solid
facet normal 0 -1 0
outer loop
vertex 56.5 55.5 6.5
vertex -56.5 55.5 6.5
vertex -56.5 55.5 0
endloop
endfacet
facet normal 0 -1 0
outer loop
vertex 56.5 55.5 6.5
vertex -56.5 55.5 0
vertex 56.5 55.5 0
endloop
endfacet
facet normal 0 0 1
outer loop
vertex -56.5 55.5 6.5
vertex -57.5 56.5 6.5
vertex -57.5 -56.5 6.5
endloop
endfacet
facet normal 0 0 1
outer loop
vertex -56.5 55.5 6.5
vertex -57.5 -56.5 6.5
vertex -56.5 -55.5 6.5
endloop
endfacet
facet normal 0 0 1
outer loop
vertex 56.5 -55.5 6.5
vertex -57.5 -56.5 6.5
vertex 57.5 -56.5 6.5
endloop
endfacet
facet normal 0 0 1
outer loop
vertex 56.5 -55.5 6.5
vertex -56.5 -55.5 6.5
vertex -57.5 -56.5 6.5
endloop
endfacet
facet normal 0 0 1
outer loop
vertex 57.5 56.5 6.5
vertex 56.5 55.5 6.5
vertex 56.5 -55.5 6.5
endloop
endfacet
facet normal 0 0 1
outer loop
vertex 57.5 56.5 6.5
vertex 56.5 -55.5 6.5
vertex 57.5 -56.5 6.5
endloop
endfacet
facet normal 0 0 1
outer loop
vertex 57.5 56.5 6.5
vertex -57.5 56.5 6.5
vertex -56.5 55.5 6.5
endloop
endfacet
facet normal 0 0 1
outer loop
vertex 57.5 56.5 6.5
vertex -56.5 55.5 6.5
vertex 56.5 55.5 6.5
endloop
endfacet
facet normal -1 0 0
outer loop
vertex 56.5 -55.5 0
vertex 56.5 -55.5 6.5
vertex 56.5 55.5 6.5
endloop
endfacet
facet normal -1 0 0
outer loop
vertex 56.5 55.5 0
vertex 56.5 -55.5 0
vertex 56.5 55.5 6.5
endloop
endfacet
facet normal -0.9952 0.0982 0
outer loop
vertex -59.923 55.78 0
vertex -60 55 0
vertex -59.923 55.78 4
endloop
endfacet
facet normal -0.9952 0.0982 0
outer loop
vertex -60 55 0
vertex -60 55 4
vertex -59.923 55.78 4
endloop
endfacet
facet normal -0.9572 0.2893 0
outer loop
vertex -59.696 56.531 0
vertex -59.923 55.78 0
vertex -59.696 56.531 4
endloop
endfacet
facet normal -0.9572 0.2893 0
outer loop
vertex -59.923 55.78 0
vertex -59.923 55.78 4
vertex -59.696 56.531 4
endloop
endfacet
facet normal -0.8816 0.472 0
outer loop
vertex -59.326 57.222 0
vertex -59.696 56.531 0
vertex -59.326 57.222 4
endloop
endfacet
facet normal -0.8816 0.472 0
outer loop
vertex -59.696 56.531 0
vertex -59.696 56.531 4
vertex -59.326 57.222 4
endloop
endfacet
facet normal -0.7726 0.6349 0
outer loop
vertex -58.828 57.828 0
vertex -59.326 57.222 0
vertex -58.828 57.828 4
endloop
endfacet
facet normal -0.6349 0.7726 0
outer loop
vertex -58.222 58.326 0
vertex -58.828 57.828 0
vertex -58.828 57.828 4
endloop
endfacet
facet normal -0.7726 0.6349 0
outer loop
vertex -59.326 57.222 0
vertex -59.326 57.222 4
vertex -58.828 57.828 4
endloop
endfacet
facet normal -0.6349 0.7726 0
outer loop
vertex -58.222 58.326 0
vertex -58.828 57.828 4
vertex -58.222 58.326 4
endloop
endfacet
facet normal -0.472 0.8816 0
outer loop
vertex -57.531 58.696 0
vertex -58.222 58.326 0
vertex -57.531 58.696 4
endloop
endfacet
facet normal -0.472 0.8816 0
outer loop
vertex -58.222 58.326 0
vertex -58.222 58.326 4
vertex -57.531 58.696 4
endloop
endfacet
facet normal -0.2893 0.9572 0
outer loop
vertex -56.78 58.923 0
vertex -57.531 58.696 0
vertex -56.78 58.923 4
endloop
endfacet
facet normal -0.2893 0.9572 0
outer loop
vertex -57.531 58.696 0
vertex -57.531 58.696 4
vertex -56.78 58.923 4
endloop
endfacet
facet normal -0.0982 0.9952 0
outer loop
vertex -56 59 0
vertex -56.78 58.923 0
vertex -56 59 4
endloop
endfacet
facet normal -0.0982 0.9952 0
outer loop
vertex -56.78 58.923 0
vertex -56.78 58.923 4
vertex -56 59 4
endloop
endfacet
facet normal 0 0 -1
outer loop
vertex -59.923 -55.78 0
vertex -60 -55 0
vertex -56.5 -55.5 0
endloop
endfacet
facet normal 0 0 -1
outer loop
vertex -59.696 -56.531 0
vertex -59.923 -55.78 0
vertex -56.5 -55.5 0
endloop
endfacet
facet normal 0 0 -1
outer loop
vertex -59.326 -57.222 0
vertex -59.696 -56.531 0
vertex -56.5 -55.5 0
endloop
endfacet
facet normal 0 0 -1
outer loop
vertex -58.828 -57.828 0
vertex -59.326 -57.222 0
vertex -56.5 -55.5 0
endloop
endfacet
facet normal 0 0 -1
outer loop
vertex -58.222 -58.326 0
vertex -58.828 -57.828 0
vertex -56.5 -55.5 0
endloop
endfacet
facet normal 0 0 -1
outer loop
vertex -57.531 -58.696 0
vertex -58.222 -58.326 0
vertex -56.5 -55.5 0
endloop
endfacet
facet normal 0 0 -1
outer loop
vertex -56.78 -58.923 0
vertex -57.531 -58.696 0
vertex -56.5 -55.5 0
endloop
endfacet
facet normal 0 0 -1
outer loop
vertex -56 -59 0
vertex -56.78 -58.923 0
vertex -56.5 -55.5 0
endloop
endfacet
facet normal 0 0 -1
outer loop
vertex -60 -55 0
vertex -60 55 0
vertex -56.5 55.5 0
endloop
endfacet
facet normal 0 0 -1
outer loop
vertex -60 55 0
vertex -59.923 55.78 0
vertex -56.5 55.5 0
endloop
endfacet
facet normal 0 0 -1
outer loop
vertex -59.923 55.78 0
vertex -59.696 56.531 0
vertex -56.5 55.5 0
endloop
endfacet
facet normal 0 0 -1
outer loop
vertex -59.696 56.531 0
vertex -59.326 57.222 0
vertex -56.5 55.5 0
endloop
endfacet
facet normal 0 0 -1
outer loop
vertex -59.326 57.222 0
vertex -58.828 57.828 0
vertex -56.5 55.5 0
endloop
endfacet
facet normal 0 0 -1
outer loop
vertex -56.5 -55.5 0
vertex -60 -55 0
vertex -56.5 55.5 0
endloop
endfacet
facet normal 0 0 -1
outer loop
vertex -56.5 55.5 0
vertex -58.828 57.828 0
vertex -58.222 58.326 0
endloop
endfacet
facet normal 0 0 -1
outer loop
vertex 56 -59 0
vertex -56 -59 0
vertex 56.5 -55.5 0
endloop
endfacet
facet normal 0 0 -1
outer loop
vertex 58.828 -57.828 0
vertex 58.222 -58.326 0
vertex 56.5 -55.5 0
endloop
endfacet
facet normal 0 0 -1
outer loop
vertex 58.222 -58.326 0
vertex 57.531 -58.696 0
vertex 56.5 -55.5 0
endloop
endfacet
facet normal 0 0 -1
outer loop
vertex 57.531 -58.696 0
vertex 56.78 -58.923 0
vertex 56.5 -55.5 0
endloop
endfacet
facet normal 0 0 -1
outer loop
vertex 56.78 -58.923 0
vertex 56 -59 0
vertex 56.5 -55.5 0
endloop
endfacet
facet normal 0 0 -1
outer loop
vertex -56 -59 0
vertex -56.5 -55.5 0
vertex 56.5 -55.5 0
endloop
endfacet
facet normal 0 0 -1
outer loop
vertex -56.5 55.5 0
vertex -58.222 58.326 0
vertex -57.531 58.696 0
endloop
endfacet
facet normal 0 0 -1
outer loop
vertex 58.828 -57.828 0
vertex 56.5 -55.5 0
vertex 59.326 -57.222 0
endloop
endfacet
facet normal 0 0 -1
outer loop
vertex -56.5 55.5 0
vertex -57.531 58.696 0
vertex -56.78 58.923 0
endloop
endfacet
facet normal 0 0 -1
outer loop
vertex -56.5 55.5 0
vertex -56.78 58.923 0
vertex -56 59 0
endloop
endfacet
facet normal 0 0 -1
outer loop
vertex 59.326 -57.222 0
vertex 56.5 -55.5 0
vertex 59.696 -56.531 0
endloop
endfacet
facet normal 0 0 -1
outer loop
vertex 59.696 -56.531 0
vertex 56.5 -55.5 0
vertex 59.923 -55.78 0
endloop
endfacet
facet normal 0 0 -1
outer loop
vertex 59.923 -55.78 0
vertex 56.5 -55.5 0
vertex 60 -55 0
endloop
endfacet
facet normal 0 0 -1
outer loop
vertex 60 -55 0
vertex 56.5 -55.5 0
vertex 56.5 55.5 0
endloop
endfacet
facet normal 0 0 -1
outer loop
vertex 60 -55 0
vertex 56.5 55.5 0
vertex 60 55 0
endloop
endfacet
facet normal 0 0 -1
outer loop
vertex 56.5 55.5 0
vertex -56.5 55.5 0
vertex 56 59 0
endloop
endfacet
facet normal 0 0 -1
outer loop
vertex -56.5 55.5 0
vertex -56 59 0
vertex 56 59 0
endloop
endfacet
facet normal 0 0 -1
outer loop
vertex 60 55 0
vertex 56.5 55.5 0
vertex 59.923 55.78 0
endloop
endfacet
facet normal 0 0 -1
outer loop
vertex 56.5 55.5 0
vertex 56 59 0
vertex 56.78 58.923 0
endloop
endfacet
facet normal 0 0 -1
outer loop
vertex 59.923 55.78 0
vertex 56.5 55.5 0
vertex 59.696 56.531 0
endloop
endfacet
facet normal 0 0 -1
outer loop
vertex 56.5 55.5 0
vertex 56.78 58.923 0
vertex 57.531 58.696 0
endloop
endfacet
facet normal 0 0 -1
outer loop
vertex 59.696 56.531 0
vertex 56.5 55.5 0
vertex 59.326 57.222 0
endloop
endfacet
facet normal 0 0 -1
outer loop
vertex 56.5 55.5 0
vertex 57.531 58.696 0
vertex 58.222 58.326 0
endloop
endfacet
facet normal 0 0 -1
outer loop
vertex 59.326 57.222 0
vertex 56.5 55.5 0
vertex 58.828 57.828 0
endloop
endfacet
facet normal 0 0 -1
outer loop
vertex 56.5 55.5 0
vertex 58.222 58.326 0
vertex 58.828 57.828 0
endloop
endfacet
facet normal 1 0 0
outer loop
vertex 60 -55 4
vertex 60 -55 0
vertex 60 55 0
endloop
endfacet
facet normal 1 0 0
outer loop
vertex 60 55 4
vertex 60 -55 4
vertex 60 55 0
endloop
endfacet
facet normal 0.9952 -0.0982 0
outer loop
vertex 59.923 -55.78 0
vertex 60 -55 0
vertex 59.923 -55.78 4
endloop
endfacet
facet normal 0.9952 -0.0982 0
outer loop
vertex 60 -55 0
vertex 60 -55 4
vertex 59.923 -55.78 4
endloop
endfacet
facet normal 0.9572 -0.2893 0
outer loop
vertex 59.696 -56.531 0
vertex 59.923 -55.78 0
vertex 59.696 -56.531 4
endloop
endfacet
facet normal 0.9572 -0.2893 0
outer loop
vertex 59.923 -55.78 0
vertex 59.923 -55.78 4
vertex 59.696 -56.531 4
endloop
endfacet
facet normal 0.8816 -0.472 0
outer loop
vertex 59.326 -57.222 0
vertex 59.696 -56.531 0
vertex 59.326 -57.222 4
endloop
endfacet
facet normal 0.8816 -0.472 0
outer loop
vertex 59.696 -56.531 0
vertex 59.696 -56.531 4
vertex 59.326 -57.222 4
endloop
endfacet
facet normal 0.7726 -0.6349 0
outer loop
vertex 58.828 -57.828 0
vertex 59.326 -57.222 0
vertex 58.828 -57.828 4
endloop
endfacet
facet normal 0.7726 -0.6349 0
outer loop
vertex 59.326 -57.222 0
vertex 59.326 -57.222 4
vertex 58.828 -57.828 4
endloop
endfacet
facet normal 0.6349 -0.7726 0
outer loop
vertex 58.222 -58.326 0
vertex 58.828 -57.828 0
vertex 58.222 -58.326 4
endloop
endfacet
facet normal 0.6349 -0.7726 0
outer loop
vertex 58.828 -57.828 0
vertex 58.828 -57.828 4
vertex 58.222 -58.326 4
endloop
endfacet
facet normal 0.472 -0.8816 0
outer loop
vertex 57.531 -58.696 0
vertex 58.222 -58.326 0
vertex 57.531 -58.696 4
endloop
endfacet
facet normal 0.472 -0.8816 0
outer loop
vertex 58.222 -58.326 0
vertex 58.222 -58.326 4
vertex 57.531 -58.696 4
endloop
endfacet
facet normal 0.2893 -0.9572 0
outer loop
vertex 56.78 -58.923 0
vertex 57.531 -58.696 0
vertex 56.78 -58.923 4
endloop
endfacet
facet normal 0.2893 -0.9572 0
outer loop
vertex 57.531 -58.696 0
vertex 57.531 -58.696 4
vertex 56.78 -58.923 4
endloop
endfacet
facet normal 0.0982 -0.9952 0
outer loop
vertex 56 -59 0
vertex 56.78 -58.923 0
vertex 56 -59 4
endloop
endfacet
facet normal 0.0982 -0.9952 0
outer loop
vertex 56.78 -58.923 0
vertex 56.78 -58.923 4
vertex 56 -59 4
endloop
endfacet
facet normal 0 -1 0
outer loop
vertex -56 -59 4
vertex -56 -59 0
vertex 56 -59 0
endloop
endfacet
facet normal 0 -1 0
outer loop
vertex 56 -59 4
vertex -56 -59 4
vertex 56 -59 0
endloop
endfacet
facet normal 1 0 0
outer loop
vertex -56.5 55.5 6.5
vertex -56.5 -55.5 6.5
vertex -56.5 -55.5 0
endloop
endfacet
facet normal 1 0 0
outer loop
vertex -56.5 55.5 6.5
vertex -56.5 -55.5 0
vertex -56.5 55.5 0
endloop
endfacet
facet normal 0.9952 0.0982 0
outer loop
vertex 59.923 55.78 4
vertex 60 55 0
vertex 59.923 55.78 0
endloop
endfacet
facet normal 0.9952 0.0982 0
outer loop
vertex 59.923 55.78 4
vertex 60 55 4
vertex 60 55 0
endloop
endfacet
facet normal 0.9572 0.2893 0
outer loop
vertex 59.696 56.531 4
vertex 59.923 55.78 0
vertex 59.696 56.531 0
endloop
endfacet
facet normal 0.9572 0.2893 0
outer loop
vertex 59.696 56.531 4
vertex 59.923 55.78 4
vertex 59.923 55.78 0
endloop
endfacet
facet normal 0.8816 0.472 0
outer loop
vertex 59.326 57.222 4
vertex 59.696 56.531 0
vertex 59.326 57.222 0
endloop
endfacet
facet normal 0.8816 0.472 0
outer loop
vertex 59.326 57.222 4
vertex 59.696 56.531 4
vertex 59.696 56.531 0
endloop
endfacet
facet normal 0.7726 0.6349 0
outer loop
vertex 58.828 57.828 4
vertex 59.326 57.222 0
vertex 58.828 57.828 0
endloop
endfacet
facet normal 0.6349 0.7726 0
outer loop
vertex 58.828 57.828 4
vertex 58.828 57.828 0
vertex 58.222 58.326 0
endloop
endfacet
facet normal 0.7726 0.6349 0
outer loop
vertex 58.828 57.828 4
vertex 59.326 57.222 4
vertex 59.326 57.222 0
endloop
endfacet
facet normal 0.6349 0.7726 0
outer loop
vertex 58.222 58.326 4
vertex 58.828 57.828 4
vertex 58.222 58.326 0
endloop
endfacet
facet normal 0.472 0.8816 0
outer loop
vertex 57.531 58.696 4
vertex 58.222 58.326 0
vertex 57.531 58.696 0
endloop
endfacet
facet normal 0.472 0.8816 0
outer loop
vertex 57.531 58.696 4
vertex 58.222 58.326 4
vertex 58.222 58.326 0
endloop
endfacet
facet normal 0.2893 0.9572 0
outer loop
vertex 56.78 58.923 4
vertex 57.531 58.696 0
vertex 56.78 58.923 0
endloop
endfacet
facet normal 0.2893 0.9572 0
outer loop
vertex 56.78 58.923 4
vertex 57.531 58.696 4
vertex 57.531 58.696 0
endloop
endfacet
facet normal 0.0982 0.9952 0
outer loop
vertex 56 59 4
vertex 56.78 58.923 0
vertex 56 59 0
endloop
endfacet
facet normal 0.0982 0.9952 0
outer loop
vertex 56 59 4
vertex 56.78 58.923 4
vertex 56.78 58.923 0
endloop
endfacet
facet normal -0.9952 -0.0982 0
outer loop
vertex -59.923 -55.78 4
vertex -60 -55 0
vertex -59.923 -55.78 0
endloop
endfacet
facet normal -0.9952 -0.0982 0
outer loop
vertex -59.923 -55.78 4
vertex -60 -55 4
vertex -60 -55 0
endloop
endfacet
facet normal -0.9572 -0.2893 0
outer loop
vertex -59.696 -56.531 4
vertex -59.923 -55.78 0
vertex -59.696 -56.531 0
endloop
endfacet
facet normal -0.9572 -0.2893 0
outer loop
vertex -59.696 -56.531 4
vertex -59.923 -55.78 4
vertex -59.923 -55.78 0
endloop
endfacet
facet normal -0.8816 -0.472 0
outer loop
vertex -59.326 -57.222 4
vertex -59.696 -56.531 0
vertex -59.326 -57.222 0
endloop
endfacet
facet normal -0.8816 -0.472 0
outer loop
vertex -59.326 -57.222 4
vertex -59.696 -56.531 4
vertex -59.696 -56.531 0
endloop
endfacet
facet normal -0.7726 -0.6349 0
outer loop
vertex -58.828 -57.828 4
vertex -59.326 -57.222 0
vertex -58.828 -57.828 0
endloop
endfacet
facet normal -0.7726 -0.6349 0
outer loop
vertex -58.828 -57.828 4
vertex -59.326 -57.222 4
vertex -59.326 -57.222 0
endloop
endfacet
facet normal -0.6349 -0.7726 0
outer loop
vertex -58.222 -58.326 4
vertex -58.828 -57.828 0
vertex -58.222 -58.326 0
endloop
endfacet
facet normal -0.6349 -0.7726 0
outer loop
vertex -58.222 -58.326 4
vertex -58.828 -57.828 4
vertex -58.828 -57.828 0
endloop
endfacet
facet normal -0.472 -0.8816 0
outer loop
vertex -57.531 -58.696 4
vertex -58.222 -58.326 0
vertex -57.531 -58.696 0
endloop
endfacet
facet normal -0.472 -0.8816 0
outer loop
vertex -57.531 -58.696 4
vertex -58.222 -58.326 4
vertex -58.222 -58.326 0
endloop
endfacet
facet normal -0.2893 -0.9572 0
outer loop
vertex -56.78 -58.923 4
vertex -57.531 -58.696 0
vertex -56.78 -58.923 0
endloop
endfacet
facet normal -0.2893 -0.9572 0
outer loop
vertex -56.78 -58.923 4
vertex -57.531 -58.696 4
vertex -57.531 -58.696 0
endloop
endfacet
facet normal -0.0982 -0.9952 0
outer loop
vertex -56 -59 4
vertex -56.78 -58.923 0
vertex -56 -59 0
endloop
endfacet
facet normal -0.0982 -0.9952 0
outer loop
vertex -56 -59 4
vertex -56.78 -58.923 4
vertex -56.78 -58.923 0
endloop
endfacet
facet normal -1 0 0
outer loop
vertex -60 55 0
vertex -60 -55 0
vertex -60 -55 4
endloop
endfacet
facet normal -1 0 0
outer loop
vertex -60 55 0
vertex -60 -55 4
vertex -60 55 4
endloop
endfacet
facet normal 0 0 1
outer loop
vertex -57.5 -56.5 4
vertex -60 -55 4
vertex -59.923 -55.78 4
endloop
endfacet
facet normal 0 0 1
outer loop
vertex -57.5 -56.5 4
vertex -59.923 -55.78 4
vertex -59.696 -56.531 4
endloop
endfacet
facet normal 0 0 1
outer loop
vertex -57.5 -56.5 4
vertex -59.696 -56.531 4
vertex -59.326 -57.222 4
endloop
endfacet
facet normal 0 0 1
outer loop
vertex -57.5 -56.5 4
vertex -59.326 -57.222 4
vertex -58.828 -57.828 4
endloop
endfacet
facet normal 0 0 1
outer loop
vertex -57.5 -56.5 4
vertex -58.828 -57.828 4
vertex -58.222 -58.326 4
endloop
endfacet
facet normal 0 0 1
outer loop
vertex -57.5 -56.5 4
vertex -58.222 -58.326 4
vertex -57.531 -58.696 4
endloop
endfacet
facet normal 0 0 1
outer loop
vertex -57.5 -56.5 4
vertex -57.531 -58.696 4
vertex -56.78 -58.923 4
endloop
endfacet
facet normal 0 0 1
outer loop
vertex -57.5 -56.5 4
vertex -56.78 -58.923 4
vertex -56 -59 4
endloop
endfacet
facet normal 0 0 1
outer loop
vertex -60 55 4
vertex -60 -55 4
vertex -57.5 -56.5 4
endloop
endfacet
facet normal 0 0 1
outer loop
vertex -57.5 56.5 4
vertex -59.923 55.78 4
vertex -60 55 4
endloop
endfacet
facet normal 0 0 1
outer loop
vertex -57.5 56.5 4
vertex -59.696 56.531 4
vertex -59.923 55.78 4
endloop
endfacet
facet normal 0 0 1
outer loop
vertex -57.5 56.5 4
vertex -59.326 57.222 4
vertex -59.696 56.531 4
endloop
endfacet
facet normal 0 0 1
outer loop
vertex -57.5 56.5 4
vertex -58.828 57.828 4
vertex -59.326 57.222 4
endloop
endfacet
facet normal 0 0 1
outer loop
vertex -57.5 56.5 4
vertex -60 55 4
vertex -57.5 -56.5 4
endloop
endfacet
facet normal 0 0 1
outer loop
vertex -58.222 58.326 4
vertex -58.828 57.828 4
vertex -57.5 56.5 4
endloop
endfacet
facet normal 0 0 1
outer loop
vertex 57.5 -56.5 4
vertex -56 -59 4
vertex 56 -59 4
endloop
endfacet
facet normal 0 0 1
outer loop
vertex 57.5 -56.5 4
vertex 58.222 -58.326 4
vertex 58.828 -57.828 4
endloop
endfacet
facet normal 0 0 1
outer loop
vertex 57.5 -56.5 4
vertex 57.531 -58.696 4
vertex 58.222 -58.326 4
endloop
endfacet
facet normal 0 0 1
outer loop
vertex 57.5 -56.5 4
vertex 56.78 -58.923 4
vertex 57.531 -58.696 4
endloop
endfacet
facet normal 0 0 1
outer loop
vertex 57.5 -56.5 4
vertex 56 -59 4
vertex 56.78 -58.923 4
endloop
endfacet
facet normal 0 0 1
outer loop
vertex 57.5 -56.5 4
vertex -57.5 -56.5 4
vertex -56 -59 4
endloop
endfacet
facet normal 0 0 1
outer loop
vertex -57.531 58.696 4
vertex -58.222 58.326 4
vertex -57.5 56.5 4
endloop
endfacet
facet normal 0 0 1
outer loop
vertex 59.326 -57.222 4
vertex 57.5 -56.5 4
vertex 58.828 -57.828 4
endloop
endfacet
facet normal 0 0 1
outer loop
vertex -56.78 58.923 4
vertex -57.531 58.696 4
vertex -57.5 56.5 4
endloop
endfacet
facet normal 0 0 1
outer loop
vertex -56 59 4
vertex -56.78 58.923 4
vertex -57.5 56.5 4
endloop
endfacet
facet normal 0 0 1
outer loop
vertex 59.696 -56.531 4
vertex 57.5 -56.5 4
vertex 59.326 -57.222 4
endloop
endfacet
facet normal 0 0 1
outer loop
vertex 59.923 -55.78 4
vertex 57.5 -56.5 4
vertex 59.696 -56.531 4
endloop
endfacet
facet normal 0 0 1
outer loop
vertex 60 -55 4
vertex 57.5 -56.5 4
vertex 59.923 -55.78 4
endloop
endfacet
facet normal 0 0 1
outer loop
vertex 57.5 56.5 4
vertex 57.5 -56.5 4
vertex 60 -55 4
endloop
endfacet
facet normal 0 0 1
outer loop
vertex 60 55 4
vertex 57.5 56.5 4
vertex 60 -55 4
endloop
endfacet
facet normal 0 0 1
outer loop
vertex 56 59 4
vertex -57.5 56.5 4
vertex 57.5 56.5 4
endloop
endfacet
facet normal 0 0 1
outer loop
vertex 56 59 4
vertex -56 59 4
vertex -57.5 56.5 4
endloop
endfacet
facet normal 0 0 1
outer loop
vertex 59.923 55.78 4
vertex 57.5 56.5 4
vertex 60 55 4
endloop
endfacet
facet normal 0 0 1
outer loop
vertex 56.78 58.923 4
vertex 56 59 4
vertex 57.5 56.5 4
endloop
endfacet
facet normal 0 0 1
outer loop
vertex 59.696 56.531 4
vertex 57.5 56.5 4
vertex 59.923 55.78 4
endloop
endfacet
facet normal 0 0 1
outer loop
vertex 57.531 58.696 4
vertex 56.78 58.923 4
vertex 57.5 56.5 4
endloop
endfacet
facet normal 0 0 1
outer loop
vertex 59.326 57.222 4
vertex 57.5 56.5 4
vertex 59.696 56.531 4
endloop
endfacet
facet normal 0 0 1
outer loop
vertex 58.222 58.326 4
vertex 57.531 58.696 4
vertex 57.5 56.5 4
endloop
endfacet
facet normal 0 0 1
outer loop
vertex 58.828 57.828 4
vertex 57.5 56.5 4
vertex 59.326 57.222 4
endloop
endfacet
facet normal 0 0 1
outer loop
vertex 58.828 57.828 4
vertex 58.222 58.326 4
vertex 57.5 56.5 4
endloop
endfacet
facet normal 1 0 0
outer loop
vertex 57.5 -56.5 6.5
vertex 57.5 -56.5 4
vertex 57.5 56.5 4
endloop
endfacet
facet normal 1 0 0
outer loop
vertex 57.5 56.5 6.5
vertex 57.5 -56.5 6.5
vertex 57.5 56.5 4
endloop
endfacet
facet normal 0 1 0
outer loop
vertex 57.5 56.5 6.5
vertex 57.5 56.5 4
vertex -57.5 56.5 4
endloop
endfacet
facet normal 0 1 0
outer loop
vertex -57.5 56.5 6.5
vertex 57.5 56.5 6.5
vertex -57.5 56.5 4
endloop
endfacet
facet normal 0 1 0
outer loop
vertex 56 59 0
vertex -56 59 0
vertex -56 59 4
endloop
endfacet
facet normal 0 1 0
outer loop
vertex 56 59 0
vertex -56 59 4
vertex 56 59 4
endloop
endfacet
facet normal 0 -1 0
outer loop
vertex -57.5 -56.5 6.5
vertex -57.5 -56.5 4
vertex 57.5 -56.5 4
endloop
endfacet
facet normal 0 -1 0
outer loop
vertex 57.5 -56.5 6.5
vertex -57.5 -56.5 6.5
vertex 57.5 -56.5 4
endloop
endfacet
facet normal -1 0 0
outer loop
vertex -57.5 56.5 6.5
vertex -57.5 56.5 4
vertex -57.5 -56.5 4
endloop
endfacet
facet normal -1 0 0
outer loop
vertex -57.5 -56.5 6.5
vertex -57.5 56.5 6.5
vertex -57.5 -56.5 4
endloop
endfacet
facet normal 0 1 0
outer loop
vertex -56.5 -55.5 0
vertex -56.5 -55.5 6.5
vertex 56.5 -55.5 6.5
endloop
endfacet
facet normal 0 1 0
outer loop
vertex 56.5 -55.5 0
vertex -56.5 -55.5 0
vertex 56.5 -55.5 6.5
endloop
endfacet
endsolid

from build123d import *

# Parameters (mm, degrees)
F0_W     = 120
F0_H     = 118
F1_DEPTH = 4
F2_W     = 1
F2_H     = 1
F2_W_2   = 113
F2_H_2   = 111
F3_DEPTH = 2.5
F4_W     = 113
F4_H     = 111
F5_DEPTH = 5
F6_R     = 4


with BuildPart() as f1:
    # F0 (on Top) → F1 (new body)
    with BuildSketch(Plane.XY):
        Rectangle(F0_W, F0_H)
    extrude(amount=F1_DEPTH)

    # F2 (on face) → F3 (join)
    with BuildSketch(Plane.XY.offset(4)):
        with Locations((-57, 56)):
            Rectangle(F2_W, F2_H)
        with Locations((0, 56)):
            Rectangle(F2_W_2, F2_H)
        with Locations((-57, 0)):
            Rectangle(F2_W, F2_H_2)
        with Locations((57, 56)):
            Rectangle(F2_W, F2_H)
        with Locations((-57, -56)):
            Rectangle(F2_W, F2_H)
        with Locations((0, -56)):
            Rectangle(F2_W_2, F2_H)
        with Locations((57, 0)):
            Rectangle(F2_W, F2_H_2)
        with Locations((57, -56)):
            Rectangle(F2_W, F2_H)
    extrude(amount=F3_DEPTH)

    # F4 (on face) → F5 (cut)
    with BuildSketch(Plane.XY.offset(4)):
        Rectangle(F4_W, F4_H)
    extrude(amount=-F5_DEPTH, mode=Mode.SUBTRACT)

    # F6
    f6_edges = [f1.edges().sort_by_distance(p)[0] for p in [
        (-60, 59, 2),
        (60, 59, 2),
        (60, -59, 2),
        (-60, -59, 2),
    ]]
    fillet(f6_edges, radius=F6_R)


solid = f1.part
